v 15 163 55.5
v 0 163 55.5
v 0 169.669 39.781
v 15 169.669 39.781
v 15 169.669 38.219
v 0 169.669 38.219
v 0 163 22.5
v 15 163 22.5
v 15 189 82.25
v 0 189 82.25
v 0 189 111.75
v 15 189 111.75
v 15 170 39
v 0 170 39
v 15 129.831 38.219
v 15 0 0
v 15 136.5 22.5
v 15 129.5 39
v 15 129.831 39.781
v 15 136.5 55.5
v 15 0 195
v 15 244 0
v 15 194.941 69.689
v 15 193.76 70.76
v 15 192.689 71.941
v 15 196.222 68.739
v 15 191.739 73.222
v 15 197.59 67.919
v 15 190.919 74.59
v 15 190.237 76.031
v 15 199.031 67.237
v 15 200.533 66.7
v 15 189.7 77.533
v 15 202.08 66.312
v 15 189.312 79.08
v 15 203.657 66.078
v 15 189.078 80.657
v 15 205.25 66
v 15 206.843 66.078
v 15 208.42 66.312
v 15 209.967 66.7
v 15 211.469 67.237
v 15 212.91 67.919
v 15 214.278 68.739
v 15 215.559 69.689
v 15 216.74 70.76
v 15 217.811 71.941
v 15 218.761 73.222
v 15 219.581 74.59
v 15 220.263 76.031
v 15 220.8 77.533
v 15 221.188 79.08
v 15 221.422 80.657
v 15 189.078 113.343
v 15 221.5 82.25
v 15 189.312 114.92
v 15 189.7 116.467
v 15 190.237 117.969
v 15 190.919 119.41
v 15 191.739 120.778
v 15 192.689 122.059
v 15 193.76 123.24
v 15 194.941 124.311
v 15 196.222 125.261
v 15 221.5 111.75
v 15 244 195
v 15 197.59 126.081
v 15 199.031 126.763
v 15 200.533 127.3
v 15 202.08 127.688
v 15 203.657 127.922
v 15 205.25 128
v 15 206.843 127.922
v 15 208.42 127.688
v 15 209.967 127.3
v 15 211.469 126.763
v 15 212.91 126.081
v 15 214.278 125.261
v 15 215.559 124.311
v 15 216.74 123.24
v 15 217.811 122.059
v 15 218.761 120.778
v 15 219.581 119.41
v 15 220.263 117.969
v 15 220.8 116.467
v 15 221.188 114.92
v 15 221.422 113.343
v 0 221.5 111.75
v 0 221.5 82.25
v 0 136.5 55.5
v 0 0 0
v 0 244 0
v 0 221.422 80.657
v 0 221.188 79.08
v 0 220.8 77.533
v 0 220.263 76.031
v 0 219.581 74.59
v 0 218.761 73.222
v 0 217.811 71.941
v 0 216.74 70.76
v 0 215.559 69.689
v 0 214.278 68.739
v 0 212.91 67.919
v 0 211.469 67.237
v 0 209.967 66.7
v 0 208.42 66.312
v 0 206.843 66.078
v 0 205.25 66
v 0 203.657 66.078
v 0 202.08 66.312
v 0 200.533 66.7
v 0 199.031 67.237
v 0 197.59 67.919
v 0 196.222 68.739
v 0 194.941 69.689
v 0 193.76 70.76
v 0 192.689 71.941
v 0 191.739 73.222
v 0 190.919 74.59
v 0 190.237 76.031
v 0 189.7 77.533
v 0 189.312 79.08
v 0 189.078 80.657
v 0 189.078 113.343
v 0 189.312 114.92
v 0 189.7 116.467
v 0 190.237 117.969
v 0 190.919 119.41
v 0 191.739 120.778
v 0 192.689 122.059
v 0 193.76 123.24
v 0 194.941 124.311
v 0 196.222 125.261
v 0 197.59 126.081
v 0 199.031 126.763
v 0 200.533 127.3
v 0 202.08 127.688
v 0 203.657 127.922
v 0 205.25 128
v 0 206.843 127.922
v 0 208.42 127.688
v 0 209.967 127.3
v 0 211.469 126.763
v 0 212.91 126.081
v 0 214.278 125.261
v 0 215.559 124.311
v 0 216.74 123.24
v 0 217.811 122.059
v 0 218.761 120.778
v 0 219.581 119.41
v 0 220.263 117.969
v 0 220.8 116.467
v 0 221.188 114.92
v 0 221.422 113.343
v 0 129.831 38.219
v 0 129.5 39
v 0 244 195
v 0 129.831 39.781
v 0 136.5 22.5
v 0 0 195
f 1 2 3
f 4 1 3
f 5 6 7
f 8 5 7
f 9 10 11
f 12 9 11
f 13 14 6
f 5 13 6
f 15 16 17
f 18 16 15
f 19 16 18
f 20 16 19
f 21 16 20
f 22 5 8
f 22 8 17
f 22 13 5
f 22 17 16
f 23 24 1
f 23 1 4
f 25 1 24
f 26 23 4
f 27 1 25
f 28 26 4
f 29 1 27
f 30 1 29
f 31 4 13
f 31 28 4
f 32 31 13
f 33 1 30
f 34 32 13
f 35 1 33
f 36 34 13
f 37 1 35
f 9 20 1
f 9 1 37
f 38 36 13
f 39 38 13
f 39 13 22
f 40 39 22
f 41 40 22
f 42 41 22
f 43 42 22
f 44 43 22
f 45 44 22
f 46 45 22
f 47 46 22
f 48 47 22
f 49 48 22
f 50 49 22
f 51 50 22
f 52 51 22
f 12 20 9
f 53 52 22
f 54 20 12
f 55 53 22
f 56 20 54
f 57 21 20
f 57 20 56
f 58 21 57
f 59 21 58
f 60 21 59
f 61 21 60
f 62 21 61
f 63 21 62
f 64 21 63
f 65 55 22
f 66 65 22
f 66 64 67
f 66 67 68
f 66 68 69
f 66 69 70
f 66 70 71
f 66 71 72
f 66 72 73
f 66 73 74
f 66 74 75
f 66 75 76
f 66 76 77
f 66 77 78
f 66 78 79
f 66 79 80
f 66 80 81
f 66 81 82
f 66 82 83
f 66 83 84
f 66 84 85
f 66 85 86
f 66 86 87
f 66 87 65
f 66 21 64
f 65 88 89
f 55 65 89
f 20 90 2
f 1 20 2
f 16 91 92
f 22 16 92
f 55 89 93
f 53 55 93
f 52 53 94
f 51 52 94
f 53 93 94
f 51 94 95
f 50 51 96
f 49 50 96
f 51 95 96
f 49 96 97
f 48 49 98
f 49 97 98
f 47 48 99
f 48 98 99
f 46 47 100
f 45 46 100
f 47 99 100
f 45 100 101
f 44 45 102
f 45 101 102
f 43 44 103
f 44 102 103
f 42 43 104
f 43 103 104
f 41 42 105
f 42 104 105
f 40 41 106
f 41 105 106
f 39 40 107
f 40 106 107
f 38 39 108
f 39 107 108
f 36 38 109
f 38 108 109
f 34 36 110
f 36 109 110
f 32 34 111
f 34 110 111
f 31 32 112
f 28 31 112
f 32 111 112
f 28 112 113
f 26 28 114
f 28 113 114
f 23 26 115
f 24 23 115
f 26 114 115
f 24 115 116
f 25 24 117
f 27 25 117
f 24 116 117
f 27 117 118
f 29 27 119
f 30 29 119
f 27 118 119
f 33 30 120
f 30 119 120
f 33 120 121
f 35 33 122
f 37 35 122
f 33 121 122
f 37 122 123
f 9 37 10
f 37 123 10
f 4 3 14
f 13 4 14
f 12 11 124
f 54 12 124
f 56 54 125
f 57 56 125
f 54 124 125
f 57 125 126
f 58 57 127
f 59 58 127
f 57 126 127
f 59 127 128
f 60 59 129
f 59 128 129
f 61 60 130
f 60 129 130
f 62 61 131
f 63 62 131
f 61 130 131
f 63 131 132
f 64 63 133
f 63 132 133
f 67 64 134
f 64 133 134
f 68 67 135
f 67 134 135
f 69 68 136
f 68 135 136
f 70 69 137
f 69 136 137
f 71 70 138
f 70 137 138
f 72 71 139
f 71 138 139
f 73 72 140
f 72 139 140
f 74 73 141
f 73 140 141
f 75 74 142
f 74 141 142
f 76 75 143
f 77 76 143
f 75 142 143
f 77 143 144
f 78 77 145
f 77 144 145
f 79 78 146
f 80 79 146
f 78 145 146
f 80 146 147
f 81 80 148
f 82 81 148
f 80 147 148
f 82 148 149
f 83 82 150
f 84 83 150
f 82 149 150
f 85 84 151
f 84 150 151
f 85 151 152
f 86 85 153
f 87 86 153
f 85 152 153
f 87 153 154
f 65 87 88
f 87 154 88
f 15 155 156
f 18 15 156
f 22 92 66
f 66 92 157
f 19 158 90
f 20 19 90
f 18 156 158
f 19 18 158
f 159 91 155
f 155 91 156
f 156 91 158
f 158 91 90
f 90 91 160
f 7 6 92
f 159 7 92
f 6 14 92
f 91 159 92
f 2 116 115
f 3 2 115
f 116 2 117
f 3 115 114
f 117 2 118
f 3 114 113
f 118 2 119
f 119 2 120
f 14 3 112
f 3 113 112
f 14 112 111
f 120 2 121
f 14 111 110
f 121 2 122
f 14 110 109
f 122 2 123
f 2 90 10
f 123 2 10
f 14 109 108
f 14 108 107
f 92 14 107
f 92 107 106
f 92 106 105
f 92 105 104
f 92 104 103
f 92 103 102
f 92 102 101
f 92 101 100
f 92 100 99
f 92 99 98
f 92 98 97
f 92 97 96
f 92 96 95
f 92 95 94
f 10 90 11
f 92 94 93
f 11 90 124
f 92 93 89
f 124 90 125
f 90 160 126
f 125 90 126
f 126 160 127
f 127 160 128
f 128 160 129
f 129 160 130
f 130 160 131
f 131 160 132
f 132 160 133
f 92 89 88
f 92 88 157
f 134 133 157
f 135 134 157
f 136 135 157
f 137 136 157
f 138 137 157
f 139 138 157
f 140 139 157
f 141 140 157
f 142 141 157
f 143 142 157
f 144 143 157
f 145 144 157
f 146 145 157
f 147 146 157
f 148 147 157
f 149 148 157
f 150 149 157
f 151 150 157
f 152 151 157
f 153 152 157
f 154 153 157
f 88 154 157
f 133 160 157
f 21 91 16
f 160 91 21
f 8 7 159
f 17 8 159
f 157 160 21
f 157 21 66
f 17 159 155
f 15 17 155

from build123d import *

# Parameters (mm, degrees)
CROQUIS1_W              = 244
CROQUIS1_H              = 195
SALIENTE_EXTRUIR1_DEPTH = 15


with BuildPart() as part:
    # Croquis1 → Saliente-Extruir1 (new body)
    with BuildSketch(Plane.YZ):
        with Locations((122, 97.5)):
            Rectangle(CROQUIS1_W, CROQUIS1_H)
        Polygon((163, 22.5), (136.5, 22.5), (129.831375645, 38.218900266), (129.5, 39), (129.831375684, 39.781099827), (136.5, 55.5), (163, 55.5), (169.668624522, 39.78109934), (170, 39), (169.668624483, 38.218900567), align=None, mode=Mode.SUBTRACT)
        with BuildLine():
            Line((189, 82.25), (189, 111.75))
            ThreePointArc((189, 111.75), (205.25, 128), (221.5, 111.75))
            Line((221.5, 111.75), (221.5, 82.25))
            ThreePointArc((221.5, 82.25), (205.25, 66), (189, 82.25))
        make_face(mode=Mode.SUBTRACT)
    extrude(amount=SALIENTE_EXTRUIR1_DEPTH)


solid = part.part
